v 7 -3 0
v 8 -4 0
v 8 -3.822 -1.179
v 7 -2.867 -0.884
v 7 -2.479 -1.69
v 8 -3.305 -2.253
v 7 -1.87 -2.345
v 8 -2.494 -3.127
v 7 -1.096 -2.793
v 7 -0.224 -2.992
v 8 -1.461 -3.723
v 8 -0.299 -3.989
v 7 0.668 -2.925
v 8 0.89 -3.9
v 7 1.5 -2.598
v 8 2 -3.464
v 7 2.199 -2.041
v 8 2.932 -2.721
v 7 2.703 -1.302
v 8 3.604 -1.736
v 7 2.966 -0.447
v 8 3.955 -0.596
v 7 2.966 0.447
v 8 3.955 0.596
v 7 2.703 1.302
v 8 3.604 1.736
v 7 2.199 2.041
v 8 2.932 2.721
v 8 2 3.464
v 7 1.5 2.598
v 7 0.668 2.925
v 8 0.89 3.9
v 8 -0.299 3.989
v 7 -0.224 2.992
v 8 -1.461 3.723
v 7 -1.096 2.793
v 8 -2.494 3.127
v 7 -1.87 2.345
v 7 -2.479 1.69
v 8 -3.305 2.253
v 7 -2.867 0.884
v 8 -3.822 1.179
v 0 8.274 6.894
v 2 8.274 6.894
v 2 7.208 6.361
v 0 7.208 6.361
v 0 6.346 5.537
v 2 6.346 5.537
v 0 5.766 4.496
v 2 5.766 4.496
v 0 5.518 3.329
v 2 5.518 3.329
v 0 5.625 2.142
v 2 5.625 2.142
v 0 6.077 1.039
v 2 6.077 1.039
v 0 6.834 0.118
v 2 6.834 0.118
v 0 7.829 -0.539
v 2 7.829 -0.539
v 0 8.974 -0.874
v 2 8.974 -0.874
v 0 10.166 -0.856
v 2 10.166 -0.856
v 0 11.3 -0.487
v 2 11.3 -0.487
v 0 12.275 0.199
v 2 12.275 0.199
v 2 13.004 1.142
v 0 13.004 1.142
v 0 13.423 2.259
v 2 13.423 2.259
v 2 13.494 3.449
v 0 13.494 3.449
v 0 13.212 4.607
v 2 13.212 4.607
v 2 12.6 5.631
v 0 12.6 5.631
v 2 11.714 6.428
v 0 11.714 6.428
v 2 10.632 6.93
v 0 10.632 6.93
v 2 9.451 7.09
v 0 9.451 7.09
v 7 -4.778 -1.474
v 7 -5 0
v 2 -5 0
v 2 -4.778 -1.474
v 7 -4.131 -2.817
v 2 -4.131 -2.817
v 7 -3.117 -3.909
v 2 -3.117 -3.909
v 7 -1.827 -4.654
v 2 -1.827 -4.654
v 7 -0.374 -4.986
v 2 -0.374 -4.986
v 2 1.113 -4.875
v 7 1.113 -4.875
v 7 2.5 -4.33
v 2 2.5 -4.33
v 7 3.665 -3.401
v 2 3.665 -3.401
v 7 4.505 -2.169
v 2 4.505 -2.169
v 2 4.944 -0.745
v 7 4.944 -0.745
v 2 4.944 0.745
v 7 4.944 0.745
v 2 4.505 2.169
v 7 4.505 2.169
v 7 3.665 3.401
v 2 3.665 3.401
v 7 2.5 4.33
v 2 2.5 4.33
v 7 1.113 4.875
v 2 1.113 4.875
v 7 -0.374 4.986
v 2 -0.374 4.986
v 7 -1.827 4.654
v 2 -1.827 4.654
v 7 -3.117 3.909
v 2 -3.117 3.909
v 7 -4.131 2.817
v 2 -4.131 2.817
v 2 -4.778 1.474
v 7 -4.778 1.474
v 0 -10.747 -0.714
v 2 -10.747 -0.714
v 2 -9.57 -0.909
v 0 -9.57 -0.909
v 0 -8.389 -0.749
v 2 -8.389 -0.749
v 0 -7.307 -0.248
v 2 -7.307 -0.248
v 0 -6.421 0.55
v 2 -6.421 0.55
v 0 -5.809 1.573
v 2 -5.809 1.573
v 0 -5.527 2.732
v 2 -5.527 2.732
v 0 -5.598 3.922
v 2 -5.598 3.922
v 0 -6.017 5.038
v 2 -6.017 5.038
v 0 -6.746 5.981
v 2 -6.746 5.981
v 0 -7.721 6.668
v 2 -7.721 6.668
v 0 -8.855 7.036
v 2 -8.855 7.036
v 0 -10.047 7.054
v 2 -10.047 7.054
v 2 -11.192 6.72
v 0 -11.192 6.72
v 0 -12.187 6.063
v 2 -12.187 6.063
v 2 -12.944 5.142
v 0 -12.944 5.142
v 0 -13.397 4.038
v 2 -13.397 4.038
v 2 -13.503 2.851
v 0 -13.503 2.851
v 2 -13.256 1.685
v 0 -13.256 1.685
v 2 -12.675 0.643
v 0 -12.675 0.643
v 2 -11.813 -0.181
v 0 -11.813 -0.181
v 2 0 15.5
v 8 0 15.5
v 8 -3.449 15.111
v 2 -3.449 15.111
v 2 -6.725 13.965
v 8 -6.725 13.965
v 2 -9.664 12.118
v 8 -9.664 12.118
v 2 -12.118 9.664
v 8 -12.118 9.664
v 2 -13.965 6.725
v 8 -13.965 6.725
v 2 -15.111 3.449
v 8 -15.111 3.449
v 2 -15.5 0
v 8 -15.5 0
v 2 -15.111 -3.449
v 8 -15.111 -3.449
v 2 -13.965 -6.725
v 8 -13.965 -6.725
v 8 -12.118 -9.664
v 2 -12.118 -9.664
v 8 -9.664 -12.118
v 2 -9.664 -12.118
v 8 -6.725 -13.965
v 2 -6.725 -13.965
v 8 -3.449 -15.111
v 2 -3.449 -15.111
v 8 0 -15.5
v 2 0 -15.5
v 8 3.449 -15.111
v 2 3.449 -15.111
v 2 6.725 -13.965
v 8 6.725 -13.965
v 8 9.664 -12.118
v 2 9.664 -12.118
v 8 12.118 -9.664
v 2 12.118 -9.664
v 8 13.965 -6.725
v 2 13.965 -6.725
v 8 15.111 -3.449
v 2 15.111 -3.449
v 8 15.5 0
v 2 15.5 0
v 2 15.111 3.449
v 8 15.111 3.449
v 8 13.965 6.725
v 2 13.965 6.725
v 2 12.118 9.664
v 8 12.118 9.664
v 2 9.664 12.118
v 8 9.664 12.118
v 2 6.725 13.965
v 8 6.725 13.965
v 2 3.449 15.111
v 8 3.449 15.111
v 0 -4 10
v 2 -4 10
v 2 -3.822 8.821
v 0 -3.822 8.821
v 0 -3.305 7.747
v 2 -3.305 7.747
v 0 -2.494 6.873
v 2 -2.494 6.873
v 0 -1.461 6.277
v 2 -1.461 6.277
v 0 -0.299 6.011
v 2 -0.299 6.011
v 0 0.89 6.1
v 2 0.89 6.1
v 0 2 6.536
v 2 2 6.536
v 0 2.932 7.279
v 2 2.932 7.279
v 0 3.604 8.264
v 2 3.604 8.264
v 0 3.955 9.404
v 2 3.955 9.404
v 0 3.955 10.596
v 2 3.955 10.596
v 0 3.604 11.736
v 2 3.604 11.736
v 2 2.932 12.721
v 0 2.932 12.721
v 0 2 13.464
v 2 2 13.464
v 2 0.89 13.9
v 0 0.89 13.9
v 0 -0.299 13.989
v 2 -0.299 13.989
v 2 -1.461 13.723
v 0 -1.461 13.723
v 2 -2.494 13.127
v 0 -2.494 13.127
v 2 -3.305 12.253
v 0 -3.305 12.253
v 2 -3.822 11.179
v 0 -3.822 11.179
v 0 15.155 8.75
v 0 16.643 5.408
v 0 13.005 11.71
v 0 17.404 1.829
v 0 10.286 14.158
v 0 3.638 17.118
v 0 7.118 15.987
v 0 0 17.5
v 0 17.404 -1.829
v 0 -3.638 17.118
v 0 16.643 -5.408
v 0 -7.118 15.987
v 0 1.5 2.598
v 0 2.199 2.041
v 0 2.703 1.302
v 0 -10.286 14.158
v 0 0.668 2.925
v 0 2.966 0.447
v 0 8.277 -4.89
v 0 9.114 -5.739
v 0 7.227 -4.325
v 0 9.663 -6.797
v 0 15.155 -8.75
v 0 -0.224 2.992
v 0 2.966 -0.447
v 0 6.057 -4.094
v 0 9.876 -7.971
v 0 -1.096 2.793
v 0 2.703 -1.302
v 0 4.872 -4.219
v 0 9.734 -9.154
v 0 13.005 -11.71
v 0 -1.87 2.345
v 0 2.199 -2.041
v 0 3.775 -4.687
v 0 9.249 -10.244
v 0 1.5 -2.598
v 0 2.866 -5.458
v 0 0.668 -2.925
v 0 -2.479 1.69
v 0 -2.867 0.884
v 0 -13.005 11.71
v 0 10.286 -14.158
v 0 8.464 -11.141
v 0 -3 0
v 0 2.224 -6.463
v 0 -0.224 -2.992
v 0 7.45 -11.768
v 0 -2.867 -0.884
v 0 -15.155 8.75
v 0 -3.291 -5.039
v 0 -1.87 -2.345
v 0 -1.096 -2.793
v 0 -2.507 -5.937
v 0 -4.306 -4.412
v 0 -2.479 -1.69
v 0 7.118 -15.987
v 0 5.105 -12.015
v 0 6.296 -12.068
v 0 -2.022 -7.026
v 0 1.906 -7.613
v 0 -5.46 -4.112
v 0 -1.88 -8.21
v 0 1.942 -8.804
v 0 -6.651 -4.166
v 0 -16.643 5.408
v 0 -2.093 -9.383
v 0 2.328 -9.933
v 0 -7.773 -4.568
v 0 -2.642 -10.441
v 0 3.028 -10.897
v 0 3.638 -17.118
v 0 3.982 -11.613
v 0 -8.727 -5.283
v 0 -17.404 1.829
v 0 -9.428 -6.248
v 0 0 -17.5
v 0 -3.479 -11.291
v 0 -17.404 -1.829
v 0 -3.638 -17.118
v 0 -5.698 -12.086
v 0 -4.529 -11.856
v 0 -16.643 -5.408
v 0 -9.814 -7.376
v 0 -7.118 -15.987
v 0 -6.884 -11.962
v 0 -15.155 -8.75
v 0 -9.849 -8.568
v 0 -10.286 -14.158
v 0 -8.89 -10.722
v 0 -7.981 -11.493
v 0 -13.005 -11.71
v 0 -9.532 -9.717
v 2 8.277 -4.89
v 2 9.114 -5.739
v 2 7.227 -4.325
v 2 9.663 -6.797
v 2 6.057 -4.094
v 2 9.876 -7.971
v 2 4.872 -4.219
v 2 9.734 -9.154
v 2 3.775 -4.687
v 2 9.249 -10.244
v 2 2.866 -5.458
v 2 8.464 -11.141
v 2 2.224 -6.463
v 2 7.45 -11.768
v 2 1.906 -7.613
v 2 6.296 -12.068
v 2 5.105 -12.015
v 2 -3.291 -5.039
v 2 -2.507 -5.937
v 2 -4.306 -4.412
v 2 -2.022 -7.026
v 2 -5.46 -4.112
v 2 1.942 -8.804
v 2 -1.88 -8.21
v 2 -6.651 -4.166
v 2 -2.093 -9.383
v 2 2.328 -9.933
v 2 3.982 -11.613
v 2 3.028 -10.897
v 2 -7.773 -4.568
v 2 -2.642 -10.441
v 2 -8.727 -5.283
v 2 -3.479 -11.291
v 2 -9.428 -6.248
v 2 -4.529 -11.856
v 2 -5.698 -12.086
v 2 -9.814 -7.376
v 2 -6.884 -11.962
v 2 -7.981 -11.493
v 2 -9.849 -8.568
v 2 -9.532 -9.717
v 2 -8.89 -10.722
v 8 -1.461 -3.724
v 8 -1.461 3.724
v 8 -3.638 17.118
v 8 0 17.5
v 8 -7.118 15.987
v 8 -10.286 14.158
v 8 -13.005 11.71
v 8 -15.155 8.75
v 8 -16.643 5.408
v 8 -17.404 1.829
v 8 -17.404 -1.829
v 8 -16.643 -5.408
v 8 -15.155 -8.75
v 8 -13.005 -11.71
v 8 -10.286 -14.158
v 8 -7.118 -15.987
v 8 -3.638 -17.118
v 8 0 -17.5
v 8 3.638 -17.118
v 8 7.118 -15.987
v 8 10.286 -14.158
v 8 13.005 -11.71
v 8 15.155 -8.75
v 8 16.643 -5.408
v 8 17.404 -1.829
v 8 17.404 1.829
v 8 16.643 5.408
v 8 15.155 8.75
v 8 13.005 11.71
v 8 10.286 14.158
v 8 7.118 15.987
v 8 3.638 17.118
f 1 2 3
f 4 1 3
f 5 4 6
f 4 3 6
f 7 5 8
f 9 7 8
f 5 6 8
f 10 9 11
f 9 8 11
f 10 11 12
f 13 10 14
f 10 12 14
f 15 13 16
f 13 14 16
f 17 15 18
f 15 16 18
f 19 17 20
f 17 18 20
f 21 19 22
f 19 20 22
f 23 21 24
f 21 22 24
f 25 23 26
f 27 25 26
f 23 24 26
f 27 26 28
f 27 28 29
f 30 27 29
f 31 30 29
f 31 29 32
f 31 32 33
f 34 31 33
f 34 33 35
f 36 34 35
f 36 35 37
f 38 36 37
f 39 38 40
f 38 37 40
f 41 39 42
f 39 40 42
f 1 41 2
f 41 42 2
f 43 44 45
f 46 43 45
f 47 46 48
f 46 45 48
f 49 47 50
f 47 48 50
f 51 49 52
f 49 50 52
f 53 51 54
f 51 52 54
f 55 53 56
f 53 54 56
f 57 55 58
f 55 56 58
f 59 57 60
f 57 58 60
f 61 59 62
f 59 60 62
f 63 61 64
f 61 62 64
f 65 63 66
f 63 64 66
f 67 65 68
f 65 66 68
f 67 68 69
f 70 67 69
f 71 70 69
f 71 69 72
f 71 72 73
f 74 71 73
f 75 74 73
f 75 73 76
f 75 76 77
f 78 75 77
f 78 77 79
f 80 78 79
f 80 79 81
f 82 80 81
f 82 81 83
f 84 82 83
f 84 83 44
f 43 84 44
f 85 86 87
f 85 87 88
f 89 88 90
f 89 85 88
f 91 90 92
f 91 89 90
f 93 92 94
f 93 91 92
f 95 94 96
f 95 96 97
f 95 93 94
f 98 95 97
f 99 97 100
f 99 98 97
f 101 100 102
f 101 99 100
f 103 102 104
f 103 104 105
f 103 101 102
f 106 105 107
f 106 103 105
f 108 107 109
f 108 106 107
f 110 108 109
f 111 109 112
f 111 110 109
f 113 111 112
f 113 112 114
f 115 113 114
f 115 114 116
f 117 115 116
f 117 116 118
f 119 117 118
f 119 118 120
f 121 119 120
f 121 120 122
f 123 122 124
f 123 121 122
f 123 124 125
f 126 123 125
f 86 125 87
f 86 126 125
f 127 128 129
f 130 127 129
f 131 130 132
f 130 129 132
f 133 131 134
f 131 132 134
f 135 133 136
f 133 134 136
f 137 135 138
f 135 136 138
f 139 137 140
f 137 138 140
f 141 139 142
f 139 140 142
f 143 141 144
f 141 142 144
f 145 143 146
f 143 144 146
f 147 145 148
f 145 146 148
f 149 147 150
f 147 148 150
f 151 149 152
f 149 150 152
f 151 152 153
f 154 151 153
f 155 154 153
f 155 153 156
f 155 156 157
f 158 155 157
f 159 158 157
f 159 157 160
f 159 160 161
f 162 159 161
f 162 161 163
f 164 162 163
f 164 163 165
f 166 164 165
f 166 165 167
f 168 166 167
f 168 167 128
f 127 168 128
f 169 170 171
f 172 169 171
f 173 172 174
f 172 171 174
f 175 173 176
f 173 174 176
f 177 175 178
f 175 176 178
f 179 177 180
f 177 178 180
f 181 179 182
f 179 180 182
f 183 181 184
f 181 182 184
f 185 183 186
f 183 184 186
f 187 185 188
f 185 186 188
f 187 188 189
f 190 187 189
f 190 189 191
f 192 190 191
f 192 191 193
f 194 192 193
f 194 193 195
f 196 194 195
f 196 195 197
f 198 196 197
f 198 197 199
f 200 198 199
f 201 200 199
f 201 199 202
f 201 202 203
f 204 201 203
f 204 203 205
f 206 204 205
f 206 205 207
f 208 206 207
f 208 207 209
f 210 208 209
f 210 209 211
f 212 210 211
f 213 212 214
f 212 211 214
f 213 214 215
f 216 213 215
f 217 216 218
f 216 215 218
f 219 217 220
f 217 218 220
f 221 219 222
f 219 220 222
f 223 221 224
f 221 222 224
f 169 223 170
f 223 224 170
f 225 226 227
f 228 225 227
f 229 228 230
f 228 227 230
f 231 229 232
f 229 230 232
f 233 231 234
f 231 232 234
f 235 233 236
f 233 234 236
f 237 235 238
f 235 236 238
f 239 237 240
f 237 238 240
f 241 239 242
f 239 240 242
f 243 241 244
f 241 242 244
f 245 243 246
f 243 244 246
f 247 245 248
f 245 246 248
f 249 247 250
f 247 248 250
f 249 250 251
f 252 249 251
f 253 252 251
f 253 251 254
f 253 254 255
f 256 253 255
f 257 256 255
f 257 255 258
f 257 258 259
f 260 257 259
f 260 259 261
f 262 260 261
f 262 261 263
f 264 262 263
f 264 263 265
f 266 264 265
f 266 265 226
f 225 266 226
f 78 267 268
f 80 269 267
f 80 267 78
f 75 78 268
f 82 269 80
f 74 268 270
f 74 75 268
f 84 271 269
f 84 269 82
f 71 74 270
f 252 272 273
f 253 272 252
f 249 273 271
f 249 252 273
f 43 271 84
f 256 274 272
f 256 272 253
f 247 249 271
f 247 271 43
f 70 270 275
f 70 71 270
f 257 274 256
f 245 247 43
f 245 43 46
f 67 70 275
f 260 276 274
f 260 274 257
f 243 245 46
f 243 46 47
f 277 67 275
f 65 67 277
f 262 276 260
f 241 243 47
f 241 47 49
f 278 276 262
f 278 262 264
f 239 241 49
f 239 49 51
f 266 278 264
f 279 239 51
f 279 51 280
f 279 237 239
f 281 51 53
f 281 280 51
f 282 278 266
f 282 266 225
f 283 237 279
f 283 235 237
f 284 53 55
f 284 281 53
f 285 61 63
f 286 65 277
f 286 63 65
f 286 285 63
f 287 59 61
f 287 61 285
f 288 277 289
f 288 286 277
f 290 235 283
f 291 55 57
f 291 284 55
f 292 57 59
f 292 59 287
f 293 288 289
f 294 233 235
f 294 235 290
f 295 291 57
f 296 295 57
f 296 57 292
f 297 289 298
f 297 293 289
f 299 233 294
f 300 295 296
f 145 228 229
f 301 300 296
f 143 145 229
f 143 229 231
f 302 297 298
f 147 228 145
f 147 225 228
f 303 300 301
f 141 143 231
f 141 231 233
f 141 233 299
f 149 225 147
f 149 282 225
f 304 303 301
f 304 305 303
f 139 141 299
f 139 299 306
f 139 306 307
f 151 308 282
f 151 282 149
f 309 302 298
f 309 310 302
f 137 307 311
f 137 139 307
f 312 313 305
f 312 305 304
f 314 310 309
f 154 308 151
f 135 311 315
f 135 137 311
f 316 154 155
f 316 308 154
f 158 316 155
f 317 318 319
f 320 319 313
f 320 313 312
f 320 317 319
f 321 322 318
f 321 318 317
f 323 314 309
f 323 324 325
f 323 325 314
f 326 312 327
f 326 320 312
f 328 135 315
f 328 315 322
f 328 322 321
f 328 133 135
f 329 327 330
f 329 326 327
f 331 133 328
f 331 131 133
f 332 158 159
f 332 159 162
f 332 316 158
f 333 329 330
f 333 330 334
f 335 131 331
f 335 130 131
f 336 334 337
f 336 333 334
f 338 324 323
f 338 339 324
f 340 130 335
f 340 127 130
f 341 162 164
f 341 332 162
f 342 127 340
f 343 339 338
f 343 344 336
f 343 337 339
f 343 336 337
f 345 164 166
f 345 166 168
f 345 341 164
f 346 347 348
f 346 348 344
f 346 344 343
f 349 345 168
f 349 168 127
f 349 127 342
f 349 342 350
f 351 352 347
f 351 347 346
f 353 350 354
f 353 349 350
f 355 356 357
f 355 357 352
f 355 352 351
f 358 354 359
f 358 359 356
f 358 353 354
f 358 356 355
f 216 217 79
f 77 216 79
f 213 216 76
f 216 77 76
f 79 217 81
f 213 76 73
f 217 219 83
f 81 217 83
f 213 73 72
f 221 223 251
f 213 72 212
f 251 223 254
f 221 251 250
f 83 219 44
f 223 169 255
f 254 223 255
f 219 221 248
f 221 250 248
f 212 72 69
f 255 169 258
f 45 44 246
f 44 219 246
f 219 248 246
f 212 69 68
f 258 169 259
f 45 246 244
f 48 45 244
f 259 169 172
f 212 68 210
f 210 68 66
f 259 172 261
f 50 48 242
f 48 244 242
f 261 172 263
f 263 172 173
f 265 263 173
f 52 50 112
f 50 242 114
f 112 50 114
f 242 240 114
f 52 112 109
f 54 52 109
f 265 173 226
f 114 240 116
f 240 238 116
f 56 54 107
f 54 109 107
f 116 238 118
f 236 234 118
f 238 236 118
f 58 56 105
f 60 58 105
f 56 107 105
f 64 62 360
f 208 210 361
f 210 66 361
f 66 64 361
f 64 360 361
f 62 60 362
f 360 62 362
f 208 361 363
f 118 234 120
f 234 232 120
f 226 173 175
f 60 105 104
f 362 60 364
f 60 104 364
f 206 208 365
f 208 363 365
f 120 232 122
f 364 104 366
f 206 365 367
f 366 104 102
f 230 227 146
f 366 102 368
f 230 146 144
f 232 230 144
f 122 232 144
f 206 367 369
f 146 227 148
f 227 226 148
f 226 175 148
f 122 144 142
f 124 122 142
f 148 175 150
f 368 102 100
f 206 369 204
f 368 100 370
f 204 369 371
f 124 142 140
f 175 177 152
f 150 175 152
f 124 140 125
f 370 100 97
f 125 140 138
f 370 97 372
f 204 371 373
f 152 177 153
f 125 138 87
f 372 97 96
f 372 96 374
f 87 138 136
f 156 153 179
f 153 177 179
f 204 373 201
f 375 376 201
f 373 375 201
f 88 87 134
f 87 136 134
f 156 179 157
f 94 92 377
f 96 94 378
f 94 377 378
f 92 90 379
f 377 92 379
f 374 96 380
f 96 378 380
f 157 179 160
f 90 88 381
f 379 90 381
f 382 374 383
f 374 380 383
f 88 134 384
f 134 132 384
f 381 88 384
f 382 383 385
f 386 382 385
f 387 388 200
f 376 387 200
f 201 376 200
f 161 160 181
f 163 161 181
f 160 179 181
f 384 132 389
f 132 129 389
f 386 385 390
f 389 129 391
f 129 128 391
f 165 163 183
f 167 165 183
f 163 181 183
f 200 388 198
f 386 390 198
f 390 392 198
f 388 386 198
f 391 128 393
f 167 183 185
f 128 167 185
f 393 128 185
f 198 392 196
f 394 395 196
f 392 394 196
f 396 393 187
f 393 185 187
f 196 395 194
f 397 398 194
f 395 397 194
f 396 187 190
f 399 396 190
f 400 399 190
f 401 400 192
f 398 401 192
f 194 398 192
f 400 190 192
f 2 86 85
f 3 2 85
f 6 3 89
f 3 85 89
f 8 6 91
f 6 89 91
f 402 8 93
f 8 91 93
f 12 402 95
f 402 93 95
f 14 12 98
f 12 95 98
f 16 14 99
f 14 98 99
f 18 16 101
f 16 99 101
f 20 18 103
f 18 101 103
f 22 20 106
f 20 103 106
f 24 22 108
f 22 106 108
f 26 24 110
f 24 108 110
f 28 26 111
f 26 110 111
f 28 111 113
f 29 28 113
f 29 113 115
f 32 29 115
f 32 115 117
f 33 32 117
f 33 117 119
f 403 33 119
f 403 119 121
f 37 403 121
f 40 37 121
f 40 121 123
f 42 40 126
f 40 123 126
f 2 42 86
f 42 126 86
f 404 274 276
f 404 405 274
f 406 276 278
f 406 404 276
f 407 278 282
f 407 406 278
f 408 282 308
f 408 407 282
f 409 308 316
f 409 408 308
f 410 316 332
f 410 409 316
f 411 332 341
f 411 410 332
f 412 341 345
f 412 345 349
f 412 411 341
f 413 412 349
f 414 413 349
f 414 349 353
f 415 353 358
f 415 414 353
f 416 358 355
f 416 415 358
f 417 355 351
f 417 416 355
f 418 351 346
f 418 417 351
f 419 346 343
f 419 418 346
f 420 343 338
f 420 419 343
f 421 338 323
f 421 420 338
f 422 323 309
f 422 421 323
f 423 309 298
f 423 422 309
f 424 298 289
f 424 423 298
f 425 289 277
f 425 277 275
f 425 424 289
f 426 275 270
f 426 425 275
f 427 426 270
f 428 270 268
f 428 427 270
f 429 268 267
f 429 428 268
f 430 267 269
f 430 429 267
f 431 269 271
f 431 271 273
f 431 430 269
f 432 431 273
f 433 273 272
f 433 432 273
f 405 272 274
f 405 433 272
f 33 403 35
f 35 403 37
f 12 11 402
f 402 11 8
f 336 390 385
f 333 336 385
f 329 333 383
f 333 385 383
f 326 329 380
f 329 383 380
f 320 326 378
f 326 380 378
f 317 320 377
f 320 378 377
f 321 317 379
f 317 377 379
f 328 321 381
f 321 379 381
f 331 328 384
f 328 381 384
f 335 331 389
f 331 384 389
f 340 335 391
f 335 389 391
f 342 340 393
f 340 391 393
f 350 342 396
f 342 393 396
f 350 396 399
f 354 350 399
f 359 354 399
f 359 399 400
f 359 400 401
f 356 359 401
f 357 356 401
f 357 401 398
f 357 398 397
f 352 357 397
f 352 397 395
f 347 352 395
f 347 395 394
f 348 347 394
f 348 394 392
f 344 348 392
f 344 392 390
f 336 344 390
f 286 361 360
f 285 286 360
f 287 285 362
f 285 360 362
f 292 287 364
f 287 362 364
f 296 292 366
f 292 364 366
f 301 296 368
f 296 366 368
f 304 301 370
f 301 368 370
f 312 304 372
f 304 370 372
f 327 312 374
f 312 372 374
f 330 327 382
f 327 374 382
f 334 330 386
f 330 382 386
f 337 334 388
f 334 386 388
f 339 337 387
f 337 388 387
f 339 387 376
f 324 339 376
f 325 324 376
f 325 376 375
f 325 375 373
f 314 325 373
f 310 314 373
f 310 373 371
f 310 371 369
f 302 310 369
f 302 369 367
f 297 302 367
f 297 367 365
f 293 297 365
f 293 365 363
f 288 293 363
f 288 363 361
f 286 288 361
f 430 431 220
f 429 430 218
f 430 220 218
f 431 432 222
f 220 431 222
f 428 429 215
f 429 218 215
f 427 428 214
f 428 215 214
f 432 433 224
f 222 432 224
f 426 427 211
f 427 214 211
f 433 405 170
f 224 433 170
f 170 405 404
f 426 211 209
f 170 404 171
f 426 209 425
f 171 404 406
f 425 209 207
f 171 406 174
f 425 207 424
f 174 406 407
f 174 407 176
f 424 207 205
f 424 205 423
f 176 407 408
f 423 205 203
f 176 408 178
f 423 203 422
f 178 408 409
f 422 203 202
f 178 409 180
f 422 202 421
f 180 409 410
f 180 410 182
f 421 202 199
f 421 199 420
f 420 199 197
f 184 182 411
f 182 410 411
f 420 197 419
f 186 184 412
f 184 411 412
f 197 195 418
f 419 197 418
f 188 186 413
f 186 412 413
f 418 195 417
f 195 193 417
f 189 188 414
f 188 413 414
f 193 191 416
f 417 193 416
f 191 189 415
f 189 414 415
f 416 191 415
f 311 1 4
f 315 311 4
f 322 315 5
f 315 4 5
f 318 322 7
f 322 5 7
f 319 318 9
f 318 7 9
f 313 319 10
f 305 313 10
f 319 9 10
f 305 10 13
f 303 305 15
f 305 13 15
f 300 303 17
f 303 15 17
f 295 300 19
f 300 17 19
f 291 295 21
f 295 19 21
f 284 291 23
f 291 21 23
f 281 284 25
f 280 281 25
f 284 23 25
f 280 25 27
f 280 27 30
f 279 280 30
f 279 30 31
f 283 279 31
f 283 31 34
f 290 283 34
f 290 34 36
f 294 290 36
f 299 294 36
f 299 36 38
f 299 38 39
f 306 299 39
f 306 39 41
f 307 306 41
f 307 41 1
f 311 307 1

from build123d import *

# Parameters (mm, degrees)
F0_W            = 8
F0_H            = 17.5
F3_D            = 6
F4_T            = -2
F6_D            = 8
F6_COPIES_COUNT = 5
F7_SIZE         = 0.99999


# Not quite as in the source:
# - a fillet or chamfer is up to 0.001 mm smaller than in the source, because OpenCascade refuses the exact size
# - a pattern or mirror of a feature is missing from the dataset's text; its kind, count and spacing are read off the source's solid


with BuildPart() as f1:
    # F0 (on Front) → F1 (revolve)
    with BuildSketch(Plane.XZ):
        with Locations((4, 8.75)):
            Rectangle(F0_W, F0_H)
    revolve(axis=Axis((4, 0, 0), (1, 0, 0)))

    # F3 (through all)
    with Locations(Plane(origin=(0, 0, 0), x_dir=(0, 1, 0), z_dir=(-1, 0, 0))):
        with Locations((0, 0)):
            Hole(F3_D / 2)

    # F4
    f4_openings = [f1.faces().sort_by_distance(p)[0] for p in [
        (8, 0, -17.005025),
    ]]
    offset(amount=F4_T, openings=f4_openings)

    # F6 (through all)
    with Locations(Plane(origin=(0, 0, 0), x_dir=(0, 1, 0), z_dir=(-1, 0, 0))):
        with Locations((0, -10)):
            f6 = Hole(F6_D / 2)

    # F6_copies: F6 ×5 about axis
    f6_copies_axis = Axis((0, 0, 0), (1, 0, 0))
    for i in range(1, F6_COPIES_COUNT):
        add(f6.rotate(f6_copies_axis, i * 360 / F6_COPIES_COUNT), mode=Mode.SUBTRACT)

    # F7 (size 1 in the source; OpenCascade refuses exactly that, so slightly less here)
    f7_edges = [f1.edges().sort_by_distance(p)[0] for p in [
        (8, -3, 0),
        (8, -5, 0),
    ]]
    chamfer(f7_edges, length=F7_SIZE)


solid = f1.part
